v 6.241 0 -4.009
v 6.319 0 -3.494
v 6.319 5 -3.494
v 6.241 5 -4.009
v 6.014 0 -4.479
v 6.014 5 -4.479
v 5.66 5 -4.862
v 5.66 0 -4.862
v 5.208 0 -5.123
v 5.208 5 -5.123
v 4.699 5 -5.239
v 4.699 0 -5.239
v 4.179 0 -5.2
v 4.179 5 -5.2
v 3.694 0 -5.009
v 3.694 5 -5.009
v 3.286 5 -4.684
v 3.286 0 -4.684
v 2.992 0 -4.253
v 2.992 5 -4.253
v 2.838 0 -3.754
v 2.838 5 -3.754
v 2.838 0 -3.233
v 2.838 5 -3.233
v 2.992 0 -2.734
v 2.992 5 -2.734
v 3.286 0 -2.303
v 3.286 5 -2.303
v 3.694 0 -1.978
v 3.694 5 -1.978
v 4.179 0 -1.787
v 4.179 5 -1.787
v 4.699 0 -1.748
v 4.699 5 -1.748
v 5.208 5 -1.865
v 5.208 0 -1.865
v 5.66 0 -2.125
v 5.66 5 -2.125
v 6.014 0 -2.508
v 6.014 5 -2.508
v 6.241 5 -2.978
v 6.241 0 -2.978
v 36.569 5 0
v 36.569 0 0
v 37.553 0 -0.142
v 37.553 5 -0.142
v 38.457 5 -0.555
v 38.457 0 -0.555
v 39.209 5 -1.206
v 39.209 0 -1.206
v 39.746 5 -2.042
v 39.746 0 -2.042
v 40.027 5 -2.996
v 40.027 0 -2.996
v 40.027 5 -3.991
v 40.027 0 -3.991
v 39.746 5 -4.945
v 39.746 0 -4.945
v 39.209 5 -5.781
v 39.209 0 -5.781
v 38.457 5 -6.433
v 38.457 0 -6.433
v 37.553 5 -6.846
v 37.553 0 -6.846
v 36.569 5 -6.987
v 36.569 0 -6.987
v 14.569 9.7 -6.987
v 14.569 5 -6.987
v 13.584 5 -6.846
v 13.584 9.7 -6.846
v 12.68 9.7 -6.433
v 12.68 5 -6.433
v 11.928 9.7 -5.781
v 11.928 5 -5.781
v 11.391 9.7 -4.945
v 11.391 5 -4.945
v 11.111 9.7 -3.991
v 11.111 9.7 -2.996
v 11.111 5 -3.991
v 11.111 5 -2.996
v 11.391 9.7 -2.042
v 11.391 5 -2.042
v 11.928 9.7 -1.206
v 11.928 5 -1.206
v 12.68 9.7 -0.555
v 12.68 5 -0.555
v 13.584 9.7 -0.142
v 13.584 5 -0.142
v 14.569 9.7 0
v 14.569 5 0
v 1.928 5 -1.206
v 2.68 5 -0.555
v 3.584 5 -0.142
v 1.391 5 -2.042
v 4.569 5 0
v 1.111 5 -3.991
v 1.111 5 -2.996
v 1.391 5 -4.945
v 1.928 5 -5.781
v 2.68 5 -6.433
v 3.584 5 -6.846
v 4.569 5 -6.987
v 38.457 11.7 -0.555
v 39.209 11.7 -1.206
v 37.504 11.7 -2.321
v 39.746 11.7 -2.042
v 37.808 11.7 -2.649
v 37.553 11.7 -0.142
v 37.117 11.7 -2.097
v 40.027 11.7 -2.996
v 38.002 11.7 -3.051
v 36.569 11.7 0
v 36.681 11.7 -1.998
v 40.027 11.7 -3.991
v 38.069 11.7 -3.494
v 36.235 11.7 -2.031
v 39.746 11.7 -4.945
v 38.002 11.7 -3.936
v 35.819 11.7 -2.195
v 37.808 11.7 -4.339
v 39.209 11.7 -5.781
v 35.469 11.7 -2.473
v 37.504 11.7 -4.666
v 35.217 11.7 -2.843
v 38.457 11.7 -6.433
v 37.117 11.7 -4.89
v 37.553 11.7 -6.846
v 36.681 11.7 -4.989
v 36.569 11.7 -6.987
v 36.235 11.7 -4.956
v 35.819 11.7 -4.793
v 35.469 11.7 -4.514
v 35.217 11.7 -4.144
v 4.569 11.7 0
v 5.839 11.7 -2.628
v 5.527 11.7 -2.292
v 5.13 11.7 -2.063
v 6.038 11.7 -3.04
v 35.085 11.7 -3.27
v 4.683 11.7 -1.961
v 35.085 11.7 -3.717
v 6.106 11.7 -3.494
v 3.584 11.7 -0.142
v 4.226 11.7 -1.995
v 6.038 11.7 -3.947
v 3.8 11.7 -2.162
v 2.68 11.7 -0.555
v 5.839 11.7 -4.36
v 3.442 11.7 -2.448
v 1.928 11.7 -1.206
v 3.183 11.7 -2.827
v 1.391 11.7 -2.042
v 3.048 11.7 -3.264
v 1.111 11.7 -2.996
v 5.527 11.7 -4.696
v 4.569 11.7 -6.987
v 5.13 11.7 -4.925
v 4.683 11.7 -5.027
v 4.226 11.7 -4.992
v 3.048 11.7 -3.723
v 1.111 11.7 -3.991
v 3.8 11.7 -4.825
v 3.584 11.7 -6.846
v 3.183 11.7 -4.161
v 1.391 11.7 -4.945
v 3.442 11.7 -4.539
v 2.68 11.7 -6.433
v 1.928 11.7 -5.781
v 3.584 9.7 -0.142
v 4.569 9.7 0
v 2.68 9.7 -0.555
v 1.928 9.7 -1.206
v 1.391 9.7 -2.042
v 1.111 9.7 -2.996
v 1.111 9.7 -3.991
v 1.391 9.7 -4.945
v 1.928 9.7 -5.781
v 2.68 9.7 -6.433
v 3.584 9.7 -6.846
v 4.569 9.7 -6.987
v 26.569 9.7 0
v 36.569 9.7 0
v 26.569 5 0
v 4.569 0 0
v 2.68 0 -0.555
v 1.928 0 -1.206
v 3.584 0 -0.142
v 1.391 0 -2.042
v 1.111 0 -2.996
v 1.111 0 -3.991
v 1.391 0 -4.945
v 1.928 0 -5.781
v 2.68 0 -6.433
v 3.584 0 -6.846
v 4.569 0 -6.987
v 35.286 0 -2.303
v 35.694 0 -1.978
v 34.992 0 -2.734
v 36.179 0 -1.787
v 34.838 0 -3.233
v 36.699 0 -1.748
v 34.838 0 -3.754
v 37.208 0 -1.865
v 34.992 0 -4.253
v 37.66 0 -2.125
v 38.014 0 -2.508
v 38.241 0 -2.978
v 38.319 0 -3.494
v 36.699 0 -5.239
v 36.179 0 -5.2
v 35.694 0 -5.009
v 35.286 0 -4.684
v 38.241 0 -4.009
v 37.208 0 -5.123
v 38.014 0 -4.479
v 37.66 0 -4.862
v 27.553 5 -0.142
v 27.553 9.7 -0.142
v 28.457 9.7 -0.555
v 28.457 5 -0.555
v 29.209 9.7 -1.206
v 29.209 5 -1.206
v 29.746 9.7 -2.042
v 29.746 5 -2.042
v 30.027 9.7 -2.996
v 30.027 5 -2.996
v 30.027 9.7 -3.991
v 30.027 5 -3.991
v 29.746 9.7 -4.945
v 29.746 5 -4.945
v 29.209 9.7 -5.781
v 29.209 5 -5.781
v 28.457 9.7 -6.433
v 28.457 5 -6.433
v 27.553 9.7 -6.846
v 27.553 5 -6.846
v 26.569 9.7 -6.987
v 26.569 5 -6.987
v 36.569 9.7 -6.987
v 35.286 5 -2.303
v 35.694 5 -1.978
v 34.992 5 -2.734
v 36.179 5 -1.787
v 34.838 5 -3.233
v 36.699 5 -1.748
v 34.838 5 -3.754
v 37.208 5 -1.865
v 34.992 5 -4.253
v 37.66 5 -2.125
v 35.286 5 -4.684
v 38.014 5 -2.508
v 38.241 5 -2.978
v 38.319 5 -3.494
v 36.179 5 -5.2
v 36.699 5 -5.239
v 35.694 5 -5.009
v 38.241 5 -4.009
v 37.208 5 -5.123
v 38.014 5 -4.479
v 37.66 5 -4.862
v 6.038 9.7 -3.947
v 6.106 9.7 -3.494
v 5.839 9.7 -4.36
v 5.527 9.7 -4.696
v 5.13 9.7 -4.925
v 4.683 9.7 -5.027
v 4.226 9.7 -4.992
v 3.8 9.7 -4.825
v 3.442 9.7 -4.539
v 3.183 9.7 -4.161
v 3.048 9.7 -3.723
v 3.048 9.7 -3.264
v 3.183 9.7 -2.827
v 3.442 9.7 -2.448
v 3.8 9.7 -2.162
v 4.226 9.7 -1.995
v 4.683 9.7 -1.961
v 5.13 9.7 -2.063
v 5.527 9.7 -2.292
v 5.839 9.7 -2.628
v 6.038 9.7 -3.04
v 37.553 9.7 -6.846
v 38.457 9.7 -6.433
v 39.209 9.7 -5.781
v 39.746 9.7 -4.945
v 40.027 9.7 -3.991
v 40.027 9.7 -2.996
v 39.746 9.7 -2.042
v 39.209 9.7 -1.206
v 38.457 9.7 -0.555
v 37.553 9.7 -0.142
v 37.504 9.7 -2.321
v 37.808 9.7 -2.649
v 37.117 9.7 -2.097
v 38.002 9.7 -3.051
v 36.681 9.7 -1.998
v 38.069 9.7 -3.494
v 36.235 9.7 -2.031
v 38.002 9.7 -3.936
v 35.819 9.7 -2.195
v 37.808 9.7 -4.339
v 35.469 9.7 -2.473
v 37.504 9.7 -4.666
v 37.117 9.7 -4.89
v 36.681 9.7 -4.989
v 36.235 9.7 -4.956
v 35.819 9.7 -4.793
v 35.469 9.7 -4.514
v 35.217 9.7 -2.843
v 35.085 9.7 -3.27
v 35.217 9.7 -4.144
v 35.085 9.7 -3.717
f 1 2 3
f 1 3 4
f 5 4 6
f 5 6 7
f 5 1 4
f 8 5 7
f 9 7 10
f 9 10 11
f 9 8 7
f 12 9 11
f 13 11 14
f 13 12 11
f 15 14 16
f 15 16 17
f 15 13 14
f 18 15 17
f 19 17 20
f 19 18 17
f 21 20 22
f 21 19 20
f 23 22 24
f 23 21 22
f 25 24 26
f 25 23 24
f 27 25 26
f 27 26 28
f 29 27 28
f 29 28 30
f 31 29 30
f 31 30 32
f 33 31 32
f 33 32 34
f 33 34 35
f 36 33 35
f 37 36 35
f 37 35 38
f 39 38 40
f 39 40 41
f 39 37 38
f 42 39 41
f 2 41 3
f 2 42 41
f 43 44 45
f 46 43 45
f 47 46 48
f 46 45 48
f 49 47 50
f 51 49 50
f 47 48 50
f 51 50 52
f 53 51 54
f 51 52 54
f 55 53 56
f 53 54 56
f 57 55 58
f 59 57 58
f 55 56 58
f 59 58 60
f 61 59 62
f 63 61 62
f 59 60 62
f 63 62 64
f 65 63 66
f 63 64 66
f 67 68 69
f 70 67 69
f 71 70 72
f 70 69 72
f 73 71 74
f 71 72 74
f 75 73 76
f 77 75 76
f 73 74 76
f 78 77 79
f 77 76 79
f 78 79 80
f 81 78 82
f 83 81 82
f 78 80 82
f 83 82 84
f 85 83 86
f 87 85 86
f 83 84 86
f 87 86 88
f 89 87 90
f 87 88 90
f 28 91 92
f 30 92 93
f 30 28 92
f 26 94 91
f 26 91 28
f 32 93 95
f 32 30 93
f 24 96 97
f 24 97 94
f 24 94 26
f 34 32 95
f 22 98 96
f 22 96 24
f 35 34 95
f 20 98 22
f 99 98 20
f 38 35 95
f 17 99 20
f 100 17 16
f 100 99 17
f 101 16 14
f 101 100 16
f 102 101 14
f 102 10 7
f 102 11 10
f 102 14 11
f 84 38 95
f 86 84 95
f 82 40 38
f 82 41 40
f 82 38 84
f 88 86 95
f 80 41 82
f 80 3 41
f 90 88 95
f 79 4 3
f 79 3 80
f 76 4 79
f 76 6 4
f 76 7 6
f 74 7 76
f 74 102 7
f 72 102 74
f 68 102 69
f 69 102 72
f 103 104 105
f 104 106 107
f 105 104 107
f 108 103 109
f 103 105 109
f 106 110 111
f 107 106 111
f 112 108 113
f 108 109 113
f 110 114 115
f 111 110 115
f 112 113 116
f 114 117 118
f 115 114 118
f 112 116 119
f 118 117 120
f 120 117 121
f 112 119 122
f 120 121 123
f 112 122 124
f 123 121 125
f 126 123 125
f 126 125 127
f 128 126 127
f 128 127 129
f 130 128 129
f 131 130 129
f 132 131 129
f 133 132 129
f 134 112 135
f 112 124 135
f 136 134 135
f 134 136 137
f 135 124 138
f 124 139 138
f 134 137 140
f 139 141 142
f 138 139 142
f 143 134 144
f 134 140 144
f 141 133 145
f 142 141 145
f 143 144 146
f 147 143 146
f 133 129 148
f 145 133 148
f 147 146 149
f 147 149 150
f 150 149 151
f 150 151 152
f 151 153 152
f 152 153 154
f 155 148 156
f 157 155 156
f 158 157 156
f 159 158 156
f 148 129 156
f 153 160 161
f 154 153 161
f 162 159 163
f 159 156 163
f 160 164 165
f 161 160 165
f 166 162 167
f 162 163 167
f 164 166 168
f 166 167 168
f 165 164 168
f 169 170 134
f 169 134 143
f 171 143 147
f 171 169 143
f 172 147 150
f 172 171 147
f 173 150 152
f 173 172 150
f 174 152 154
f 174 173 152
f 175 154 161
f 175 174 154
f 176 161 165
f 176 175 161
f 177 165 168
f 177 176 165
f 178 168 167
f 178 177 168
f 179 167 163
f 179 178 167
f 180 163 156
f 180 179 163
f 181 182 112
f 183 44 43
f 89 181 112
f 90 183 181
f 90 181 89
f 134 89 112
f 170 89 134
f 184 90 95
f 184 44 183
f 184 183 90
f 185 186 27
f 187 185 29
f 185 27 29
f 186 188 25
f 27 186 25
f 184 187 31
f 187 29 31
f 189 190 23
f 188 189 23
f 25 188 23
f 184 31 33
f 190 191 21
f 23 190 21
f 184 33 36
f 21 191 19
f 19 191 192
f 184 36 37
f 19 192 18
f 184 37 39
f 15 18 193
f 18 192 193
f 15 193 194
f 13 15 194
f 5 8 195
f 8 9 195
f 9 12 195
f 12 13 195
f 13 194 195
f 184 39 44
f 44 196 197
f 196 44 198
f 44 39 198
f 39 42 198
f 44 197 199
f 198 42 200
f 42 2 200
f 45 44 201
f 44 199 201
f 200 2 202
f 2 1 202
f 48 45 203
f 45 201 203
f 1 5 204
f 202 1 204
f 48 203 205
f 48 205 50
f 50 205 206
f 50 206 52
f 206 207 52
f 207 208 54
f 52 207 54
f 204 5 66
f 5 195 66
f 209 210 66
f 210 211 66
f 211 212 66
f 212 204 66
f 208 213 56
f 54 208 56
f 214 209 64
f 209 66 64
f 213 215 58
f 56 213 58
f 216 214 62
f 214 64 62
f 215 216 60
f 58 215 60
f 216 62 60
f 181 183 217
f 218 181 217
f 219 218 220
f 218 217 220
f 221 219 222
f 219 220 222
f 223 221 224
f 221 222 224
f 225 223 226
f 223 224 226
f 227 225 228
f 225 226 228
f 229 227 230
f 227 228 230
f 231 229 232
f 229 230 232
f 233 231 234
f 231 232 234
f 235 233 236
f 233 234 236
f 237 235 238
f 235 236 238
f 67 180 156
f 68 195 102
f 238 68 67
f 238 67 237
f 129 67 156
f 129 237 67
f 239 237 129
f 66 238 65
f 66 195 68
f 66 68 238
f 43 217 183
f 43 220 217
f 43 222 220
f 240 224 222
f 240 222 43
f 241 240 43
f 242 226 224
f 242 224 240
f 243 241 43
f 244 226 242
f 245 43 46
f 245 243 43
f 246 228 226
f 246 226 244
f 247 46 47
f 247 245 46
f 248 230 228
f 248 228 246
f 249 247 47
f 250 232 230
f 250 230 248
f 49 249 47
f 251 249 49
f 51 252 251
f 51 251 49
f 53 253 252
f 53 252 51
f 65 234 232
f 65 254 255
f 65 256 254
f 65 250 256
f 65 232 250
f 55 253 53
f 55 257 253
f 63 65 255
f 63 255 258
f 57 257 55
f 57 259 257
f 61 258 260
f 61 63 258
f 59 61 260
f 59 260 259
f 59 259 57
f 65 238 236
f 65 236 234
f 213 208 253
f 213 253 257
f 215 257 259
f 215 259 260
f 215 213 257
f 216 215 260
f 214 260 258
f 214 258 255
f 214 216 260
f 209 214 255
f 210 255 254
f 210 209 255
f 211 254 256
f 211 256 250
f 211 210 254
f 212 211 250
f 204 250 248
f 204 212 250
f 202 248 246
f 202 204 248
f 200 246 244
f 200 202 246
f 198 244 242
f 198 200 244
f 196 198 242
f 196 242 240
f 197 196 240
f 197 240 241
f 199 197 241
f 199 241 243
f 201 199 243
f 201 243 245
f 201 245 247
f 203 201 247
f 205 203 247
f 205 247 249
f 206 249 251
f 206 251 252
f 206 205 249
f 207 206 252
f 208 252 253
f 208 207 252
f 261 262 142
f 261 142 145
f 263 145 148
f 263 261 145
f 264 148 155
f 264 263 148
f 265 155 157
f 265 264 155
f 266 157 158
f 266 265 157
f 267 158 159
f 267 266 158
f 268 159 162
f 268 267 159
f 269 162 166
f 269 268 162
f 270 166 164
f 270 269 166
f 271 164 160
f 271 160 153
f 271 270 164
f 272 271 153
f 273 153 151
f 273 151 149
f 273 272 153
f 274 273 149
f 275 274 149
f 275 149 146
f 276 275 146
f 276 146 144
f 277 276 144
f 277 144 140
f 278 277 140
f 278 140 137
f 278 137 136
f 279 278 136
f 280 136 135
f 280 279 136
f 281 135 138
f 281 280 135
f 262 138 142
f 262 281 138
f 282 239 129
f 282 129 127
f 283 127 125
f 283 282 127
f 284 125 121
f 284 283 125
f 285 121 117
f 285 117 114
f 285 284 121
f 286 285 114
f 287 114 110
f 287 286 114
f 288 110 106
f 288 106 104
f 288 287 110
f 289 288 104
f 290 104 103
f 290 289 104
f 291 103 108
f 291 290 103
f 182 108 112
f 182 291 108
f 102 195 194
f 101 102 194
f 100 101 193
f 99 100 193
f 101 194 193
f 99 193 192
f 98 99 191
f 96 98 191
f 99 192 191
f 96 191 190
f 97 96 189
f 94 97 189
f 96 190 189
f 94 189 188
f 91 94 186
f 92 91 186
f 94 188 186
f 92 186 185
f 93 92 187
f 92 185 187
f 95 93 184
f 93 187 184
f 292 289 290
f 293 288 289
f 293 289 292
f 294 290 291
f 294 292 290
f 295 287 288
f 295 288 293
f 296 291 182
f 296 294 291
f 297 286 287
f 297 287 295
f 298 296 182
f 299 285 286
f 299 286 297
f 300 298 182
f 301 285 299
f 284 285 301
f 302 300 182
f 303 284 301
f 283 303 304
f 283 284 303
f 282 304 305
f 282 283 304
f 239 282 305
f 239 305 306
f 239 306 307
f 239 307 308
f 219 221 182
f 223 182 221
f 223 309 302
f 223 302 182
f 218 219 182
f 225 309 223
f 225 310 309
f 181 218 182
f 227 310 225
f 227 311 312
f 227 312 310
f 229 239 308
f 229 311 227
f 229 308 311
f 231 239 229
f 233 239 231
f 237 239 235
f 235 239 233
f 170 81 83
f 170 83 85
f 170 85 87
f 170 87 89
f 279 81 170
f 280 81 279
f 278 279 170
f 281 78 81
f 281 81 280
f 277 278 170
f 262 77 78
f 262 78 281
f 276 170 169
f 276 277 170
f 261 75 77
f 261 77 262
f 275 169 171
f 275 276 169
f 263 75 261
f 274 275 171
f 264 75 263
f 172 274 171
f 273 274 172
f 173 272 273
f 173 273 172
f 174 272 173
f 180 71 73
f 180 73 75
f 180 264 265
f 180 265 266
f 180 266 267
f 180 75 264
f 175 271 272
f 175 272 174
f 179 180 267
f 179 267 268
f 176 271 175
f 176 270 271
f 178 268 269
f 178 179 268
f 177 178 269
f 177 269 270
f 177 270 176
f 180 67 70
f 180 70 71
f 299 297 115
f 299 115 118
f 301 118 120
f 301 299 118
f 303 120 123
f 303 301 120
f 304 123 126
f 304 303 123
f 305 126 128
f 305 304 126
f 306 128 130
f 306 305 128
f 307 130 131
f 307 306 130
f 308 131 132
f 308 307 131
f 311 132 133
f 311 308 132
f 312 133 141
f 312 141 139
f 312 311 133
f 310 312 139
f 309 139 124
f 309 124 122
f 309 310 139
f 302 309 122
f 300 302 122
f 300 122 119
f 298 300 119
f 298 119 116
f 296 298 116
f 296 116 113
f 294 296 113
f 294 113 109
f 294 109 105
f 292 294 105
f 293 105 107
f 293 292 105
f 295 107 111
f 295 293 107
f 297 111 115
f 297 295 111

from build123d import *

# Parameters (mm, degrees)
CROQUIS1_R              = 1.75
SALIENTE_EXTRUIR1_DEPTH = 5
CROQUIS2_R              = 3.493601412
CROQUIS2_W              = 12
CROQUIS2_H              = 6.987202823
SALIENTE_EXTRUIR2_DEPTH = 4.7
CROQUIS3_R              = 1.537305571
CROQUIS3_R_2            = 1.5
SALIENTE_EXTRUIR3_DEPTH = 2


with BuildPart() as part:
    # Croquis1 → Saliente-Extruir1 (new body)
    with BuildSketch(Plane(origin=(0, 0, 0), x_dir=(1, 0, 0), z_dir=(0, 1, 0))):
        with BuildLine():
            Line((36.568555692, 6.987202823), (4.568555692, 6.987202823))
            ThreePointArc((4.568555692, 6.987202823), (1.07495428, 3.493601412), (4.568555692, 0))
            Line((4.568555692, 0), (36.568555692, 0))
            ThreePointArc((36.568555692, 0), (40.062157104, 3.493601412), (36.568555692, 6.987202823))
        make_face()
        with Locations((4.568555692, 3.493601412)):
            Circle(CROQUIS1_R, mode=Mode.SUBTRACT)
        with Locations((36.568555692, 3.493601412)):
            Circle(CROQUIS1_R, mode=Mode.SUBTRACT)
    extrude(amount=SALIENTE_EXTRUIR1_DEPTH)

    # Croquis2 → Saliente-Extruir2 (add)
    with BuildSketch(Plane(origin=(0, 5, 0), x_dir=(1, 0, 0), z_dir=(0, 1, 0))):
        with Locations((26.568555692, 3.493601412)):
            Circle(CROQUIS2_R)
        with Locations((14.568555692, 3.493601412)):
            Circle(CROQUIS2_R)
        with Locations((20.568555692, 3.493601412)):
            Rectangle(CROQUIS2_W, CROQUIS2_H)
    extrude(amount=SALIENTE_EXTRUIR2_DEPTH)

    # Croquis3 → Saliente-Extruir3 (add)
    with BuildSketch(Plane(origin=(0, 9.7, 0), x_dir=(1, 0, 0), z_dir=(0, 1, 0))):
        with BuildLine():
            Line((4.568555692, 6.987202823), (36.568555692, 6.987202823))
            ThreePointArc((36.568555692, 6.987202823), (40.062157104, 3.493601412), (36.568555692, 0))
            Line((36.568555692, 0), (4.568555692, 0))
            ThreePointArc((4.568555692, 0), (1.07495428, 3.493601412), (4.568555692, 6.987202823))
        make_face()
        with Locations((4.568555692, 3.493601412)):
            Circle(CROQUIS3_R, mode=Mode.SUBTRACT)
        with Locations((36.568555692, 3.493601412)):
            Circle(CROQUIS3_R_2, mode=Mode.SUBTRACT)
    extrude(amount=SALIENTE_EXTRUIR3_DEPTH)


solid = part.part
